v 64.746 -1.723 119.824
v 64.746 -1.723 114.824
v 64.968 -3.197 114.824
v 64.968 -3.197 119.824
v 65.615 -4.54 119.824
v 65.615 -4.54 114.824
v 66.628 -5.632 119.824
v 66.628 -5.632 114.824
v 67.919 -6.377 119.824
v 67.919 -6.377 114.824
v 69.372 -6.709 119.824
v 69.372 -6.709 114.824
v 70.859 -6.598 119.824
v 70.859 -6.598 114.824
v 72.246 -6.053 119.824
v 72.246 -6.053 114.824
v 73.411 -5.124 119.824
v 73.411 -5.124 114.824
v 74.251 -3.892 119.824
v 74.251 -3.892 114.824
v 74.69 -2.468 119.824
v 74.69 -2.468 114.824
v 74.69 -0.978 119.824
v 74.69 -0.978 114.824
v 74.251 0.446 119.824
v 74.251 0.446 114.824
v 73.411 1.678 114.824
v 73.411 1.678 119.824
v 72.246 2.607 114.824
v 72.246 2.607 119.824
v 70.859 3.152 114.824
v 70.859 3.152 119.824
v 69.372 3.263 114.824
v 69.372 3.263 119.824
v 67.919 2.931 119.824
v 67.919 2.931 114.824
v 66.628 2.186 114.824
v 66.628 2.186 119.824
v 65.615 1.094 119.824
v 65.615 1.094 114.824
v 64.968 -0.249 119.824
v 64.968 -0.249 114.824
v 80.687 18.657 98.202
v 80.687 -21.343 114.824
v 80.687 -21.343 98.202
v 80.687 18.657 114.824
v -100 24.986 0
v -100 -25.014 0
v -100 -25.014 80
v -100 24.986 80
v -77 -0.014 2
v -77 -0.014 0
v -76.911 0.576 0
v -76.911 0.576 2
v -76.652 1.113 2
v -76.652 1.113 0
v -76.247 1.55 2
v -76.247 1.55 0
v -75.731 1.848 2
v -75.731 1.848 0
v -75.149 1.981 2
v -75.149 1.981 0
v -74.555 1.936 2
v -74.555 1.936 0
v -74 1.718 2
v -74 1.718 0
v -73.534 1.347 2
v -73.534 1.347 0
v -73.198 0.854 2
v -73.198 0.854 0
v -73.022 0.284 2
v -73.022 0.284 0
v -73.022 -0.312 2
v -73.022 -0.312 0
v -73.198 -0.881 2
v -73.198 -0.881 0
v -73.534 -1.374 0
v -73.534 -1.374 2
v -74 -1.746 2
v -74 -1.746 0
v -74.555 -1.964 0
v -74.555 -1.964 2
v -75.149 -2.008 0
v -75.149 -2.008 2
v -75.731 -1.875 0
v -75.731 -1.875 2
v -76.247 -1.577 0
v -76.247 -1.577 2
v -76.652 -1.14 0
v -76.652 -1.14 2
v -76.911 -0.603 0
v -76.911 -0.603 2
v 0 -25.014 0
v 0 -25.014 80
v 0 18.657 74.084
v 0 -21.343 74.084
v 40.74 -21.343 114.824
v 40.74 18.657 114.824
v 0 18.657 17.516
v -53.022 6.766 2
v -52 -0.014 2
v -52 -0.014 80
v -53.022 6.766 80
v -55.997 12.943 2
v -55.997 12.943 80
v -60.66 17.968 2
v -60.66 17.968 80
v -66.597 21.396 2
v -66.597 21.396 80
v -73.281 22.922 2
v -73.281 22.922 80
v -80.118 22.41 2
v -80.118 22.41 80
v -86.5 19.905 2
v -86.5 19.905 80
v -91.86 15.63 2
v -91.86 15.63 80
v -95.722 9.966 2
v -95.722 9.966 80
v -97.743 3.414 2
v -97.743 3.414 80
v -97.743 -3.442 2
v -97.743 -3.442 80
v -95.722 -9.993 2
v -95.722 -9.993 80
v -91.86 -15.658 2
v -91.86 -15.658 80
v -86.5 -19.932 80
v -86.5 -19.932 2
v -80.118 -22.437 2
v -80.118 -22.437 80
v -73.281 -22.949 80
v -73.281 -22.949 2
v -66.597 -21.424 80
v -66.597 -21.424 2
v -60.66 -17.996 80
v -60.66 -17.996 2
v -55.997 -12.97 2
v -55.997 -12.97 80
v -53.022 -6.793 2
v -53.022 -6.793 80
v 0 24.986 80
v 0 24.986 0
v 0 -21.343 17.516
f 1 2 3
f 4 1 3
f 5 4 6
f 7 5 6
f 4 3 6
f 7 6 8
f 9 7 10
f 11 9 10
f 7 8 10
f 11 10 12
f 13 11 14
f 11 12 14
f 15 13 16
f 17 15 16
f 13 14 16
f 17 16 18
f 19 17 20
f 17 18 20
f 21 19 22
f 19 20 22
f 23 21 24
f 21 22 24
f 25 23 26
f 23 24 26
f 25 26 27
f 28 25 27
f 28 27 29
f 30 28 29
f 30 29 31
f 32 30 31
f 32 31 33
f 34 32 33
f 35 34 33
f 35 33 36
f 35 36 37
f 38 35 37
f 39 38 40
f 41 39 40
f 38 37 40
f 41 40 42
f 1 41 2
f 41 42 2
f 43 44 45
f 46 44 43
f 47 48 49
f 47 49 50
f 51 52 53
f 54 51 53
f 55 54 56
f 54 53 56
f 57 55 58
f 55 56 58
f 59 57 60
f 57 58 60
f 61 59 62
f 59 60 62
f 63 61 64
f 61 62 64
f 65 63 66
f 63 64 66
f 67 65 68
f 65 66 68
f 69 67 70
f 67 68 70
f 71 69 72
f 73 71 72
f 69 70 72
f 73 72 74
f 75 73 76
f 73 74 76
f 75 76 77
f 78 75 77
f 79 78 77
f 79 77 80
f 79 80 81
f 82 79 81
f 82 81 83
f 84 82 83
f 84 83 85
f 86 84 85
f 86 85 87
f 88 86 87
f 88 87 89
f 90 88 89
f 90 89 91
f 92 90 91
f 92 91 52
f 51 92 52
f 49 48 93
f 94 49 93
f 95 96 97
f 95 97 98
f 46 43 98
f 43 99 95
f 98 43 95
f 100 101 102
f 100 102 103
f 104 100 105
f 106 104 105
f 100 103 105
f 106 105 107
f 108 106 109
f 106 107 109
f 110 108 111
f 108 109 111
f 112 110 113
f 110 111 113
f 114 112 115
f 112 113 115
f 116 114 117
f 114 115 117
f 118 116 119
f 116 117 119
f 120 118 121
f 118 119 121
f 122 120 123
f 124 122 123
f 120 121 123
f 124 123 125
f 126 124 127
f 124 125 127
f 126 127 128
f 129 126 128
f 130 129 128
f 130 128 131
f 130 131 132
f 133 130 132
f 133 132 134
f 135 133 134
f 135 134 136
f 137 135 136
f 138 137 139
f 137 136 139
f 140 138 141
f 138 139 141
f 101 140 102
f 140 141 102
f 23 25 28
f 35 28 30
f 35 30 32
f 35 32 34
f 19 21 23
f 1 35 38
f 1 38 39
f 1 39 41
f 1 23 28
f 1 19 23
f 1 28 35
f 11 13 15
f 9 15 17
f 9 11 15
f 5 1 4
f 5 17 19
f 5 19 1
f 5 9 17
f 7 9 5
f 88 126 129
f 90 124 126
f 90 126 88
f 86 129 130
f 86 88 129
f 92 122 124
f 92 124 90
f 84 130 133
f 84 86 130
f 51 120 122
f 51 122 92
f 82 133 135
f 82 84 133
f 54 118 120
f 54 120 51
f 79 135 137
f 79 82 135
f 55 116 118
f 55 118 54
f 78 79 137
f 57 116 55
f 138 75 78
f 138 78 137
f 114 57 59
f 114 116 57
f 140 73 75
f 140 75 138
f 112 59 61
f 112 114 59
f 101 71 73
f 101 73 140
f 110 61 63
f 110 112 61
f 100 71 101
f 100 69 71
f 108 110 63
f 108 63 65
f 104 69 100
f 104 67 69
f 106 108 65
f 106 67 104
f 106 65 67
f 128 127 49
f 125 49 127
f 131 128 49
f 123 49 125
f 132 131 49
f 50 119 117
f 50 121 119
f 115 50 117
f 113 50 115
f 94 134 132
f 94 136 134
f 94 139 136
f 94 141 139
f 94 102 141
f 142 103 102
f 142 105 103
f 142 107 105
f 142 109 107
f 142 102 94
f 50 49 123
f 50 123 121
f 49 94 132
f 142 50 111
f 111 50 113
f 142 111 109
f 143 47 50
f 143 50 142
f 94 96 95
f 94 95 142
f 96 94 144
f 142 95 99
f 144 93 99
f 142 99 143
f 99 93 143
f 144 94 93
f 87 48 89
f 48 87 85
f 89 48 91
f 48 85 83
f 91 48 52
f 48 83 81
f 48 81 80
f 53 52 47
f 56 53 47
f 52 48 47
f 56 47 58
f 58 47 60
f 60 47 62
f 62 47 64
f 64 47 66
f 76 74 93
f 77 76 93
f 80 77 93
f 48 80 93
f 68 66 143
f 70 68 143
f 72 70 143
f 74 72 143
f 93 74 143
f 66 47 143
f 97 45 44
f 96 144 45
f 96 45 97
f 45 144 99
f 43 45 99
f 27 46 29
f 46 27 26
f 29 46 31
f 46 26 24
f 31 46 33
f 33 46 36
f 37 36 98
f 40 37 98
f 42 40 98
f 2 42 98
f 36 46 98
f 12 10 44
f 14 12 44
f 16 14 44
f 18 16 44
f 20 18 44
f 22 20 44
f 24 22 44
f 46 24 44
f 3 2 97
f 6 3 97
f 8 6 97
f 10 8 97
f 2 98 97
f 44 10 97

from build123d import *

# Parameters (mm, degrees)
IZIM1_W                     = 100
IZIM1_H                     = 50
Y_KSEKLIK_EKSTR_ZYON1_DEPTH = 80
IZIM2_W                     = 40
IZIM2_H                     = 40
Y_KSEKLIK_EKSTR_ZYON6_DEPTH = 150
KES_EKSTR_ZYON4_DEPTH       = 50
IZIM12_R                    = 5
Y_KSEKLIK_EKSTR_ZYON9_DEPTH = 5
IZIM13_R                    = 23
KES_EKSTR_ZYON9_DEPTH       = 78
IZIM14_R                    = 2
KES_EKSTR_ZYON10_DEPTH      = 78
IZIM15_W                    = 16.621675202
IZIM15_H                    = 40
KES_EKSTR_ZYON15_DEPTH      = 20


with BuildPart() as part:
    # Çizim1 → Yükseklik-Ekstrüzyon1 (new body)
    with BuildSketch(Plane.XY):
        with Locations((-50, -0.013722327)):
            Rectangle(IZIM1_W, IZIM1_H)
    extrude(amount=Y_KSEKLIK_EKSTR_ZYON1_DEPTH)

    # Çizim2 → Yükseklik-Ekstrüzyon6 (add)
    with BuildSketch(Plane(origin=(0, 0, 0), x_dir=(0, 1, 0), z_dir=(0.7071067811865561, 0, 0.7071067811865389))):
        with Locations((-1.342558947, 32.385430267)):
            Rectangle(IZIM2_W, IZIM2_H)
    extrude(amount=Y_KSEKLIK_EKSTR_ZYON6_DEPTH)

    # Çizim11 → Kes-Ekstrüzyon4 (cut)
    with BuildSketch(Plane(origin=(0, 0, 114.823838907), x_dir=(0, 1, 0), z_dir=(0, 0, 1))):
        Polygon((18.657441053, -97.308195449), (-21.342558947, -97.308195449), (-41.210000873, -31.823007329), (29.36267087, -31.823007329), align=None)
    extrude(amount=KES_EKSTR_ZYON4_DEPTH, mode=Mode.SUBTRACT)

    # Çizim12 → Yükseklik-Ekstrüzyon9 (add)
    with BuildSketch(Plane.XY.offset(114.823838907)):
        with Locations(Location((69.745895445, -1.722983567, 0), (0, 0, 180))):
            Circle(IZIM12_R)
    extrude(amount=Y_KSEKLIK_EKSTR_ZYON9_DEPTH)

    # Çizim13 → Kes-Ekstrüzyon9 (cut)
    with BuildSketch(Plane.XY.offset(80)):
        with Locations((-75, -0.013722327)):
            Circle(IZIM13_R)
    extrude(amount=-KES_EKSTR_ZYON9_DEPTH, mode=Mode.SUBTRACT)

    # Çizim14 → Kes-Ekstrüzyon10 (cut)
    with BuildSketch(Plane(origin=(0, 0, 0), x_dir=(-1, 0, 0), z_dir=(0, 0, -1))):
        with Locations((75, -0.013722327)):
            Circle(IZIM14_R)
    extrude(amount=-KES_EKSTR_ZYON10_DEPTH, mode=Mode.SUBTRACT)

    # Çizim15 → Kes-Ekstrüzyon15 (cut)
    with BuildSketch(Plane.XY.offset(114.823838907)):
        with Locations((88.997357848, -1.342558947)):
            Rectangle(IZIM15_W, IZIM15_H)
    extrude(amount=-KES_EKSTR_ZYON15_DEPTH, mode=Mode.SUBTRACT)


solid = part.part
